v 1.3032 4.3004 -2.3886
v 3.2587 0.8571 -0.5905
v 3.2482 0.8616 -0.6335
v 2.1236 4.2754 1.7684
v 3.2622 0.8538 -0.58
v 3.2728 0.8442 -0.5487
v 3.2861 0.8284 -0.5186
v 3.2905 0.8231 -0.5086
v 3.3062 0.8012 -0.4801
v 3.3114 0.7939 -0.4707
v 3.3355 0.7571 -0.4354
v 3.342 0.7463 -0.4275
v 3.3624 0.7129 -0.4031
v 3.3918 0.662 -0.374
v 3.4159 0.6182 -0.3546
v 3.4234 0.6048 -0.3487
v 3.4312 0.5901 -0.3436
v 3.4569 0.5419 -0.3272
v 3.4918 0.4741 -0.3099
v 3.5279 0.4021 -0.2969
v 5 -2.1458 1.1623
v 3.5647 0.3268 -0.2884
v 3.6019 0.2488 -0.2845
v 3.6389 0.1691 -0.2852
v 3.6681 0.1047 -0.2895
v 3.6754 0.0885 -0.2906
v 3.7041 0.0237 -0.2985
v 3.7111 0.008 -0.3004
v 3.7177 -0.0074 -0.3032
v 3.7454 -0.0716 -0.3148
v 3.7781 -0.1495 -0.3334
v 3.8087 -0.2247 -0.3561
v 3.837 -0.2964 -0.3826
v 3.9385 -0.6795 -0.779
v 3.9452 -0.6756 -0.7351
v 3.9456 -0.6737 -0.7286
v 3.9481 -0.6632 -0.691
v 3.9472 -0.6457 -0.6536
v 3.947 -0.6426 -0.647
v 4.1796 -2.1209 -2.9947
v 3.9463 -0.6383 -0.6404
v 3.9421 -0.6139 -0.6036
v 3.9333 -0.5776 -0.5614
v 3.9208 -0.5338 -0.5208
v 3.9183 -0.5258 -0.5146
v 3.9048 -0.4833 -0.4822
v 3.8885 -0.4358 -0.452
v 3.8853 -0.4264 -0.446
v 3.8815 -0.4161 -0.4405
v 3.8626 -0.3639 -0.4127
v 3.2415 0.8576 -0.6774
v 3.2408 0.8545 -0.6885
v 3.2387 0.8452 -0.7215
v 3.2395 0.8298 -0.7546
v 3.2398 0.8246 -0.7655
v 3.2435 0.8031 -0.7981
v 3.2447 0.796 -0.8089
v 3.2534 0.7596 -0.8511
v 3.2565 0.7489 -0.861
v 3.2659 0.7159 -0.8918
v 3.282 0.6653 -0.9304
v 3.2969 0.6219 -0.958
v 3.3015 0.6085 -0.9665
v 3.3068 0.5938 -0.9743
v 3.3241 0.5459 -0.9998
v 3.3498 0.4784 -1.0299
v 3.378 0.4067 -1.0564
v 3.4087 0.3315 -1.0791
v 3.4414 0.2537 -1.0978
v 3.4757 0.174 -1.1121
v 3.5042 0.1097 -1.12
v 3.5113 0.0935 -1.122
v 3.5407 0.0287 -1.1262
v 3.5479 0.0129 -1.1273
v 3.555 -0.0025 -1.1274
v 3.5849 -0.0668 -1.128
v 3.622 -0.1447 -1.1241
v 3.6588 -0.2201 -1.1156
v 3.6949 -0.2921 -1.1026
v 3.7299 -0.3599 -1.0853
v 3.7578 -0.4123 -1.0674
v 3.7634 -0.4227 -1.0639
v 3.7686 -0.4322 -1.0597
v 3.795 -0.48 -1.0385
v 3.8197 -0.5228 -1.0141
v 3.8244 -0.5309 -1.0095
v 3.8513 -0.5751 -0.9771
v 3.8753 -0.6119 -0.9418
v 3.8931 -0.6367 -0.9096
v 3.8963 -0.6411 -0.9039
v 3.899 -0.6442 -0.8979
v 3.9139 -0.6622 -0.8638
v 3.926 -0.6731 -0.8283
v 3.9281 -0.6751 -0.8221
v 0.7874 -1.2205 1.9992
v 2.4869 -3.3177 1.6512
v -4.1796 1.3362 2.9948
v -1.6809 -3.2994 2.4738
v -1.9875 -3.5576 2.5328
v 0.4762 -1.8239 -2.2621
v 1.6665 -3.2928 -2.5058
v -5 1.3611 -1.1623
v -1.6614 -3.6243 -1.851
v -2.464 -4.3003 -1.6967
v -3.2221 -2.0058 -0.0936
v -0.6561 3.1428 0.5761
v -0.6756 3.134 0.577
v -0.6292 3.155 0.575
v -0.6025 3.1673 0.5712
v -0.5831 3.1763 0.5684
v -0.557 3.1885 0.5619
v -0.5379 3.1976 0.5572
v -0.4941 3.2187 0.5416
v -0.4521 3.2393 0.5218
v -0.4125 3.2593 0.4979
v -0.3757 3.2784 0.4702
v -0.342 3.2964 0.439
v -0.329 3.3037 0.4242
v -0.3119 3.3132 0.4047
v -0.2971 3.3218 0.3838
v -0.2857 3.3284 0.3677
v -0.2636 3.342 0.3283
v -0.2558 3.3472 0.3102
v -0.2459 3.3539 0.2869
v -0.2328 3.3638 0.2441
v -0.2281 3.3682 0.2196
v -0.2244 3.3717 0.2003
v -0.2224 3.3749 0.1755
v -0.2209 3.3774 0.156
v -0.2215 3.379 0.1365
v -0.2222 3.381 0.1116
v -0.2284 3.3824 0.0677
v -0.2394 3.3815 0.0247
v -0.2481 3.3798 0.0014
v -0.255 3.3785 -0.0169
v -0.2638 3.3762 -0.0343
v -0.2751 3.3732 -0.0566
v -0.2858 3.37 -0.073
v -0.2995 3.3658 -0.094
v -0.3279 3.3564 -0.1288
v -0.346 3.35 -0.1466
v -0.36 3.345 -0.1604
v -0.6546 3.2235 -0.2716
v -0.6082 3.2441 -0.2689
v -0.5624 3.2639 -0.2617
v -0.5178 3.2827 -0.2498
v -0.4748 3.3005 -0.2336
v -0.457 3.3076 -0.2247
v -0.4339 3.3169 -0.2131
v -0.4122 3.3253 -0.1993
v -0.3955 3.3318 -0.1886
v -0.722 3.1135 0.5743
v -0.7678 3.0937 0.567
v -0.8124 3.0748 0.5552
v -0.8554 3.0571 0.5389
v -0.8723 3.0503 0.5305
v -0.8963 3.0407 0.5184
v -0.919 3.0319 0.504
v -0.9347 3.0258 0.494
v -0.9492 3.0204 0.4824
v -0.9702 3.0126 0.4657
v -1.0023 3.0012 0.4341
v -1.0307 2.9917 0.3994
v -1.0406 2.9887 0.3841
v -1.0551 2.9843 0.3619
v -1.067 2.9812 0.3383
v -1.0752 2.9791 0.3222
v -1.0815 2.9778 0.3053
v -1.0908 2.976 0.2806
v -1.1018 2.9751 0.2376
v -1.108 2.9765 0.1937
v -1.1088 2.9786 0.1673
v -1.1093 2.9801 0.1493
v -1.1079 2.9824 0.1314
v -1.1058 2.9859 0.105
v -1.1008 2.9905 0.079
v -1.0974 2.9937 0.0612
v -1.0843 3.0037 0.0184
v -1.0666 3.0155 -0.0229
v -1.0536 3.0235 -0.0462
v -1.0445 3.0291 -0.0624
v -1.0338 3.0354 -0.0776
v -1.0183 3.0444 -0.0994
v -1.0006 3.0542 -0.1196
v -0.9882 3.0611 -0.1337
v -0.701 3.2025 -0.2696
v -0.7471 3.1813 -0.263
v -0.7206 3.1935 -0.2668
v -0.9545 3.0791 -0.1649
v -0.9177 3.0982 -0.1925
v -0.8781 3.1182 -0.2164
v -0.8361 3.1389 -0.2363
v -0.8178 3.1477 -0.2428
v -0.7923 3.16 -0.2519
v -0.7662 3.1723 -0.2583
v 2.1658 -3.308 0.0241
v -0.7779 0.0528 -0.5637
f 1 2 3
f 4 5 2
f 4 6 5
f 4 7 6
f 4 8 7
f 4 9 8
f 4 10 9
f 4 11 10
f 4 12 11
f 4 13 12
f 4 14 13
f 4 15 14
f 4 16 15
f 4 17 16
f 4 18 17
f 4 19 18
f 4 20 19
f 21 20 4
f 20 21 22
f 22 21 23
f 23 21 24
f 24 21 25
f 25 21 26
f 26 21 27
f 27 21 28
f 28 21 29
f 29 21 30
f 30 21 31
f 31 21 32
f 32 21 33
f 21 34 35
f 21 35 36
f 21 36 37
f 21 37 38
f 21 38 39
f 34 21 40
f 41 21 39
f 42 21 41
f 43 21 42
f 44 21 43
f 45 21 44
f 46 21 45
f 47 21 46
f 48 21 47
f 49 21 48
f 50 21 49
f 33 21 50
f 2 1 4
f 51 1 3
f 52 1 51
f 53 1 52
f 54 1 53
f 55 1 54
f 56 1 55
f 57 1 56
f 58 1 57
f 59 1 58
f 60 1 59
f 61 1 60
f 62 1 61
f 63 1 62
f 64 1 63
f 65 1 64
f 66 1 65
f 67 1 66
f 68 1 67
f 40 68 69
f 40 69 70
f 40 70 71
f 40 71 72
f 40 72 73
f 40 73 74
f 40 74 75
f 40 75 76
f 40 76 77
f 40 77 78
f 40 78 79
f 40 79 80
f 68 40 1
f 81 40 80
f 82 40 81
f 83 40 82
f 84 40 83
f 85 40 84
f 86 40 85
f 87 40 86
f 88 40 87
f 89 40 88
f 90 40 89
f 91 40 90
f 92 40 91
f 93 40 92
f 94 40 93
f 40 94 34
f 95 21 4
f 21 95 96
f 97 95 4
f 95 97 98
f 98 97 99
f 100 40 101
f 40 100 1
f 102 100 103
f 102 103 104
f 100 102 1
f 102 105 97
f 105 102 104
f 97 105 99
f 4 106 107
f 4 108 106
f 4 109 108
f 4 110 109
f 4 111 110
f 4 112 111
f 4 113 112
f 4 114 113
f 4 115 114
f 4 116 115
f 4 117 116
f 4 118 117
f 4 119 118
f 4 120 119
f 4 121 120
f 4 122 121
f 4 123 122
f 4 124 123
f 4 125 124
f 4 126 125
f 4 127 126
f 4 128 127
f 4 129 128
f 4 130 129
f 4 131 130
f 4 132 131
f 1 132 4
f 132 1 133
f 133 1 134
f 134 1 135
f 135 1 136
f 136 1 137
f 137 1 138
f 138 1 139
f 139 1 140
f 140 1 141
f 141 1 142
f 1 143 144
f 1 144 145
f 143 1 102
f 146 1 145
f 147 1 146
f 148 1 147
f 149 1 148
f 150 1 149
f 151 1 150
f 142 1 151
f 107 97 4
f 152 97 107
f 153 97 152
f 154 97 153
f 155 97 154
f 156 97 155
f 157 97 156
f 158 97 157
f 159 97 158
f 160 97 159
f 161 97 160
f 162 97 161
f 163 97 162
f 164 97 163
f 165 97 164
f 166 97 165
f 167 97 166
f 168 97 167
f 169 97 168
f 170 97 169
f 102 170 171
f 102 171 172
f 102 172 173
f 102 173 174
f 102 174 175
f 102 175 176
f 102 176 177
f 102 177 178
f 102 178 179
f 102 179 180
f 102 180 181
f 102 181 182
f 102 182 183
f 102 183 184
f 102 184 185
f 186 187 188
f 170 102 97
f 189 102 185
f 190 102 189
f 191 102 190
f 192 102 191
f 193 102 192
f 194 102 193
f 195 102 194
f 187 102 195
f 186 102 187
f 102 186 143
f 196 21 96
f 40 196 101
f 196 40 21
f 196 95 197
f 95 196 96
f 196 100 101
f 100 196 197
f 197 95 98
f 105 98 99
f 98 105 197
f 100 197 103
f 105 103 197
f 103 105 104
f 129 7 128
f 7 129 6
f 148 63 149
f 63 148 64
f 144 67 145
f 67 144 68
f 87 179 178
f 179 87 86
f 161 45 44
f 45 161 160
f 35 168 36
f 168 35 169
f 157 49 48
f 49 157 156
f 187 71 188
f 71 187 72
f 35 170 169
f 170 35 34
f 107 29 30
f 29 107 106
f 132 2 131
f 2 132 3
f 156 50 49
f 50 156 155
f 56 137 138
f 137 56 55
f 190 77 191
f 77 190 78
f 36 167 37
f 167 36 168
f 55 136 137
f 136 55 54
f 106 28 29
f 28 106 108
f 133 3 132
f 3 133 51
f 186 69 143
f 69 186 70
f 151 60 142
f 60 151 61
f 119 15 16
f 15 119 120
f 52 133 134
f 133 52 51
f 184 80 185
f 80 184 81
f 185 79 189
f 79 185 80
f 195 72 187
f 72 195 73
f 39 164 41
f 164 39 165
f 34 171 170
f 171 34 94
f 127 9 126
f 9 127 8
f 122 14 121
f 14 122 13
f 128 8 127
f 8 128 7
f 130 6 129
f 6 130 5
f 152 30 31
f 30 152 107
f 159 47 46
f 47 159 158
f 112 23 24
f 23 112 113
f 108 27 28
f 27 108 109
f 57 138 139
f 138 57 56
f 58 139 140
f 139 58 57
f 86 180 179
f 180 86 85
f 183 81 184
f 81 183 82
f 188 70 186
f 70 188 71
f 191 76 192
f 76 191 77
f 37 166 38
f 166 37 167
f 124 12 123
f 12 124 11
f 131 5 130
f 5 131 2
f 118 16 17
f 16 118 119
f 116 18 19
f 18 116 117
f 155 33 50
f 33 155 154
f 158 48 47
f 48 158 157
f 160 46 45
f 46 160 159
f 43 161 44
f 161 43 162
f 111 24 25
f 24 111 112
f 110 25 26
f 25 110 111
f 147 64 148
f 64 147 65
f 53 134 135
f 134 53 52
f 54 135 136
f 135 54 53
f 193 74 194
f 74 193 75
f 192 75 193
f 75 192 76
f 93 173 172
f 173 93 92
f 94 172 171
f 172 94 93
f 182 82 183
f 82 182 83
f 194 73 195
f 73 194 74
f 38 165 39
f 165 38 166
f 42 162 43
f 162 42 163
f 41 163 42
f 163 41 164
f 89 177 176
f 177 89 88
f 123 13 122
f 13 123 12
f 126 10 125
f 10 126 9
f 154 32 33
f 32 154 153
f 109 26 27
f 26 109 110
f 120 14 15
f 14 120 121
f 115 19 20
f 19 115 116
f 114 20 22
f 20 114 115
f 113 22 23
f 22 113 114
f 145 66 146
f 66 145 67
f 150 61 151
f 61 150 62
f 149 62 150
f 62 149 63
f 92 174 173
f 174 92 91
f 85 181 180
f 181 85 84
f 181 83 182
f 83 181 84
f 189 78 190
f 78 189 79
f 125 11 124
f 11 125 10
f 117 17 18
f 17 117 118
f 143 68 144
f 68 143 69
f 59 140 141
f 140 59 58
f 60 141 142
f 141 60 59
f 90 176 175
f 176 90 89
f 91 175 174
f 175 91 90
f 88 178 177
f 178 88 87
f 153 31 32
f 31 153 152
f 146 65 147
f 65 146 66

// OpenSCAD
translate([-2.123638, -5.060162, -1.768424])
rotate([5, 10, 25])
difference() {
  difference() {
    cube(size = [7.062127, 7.062127, 4.237276], center = false);
    translate([-2.118638, -3.531063, -2.118638])
    rotate([30, 0, 15])
    cube(size = [7.062127, 7.062127, 7.062127], center = false);
  }
  translate([8.474552, 0.000000, 2.118638])
  rotate([0, 0, 30])
  rotate([-90, 0, 0])
  cylinder(h = 14.124254, r1 = 0.423728, r2 = 0.423728, center = false, $fn = 60);
}
